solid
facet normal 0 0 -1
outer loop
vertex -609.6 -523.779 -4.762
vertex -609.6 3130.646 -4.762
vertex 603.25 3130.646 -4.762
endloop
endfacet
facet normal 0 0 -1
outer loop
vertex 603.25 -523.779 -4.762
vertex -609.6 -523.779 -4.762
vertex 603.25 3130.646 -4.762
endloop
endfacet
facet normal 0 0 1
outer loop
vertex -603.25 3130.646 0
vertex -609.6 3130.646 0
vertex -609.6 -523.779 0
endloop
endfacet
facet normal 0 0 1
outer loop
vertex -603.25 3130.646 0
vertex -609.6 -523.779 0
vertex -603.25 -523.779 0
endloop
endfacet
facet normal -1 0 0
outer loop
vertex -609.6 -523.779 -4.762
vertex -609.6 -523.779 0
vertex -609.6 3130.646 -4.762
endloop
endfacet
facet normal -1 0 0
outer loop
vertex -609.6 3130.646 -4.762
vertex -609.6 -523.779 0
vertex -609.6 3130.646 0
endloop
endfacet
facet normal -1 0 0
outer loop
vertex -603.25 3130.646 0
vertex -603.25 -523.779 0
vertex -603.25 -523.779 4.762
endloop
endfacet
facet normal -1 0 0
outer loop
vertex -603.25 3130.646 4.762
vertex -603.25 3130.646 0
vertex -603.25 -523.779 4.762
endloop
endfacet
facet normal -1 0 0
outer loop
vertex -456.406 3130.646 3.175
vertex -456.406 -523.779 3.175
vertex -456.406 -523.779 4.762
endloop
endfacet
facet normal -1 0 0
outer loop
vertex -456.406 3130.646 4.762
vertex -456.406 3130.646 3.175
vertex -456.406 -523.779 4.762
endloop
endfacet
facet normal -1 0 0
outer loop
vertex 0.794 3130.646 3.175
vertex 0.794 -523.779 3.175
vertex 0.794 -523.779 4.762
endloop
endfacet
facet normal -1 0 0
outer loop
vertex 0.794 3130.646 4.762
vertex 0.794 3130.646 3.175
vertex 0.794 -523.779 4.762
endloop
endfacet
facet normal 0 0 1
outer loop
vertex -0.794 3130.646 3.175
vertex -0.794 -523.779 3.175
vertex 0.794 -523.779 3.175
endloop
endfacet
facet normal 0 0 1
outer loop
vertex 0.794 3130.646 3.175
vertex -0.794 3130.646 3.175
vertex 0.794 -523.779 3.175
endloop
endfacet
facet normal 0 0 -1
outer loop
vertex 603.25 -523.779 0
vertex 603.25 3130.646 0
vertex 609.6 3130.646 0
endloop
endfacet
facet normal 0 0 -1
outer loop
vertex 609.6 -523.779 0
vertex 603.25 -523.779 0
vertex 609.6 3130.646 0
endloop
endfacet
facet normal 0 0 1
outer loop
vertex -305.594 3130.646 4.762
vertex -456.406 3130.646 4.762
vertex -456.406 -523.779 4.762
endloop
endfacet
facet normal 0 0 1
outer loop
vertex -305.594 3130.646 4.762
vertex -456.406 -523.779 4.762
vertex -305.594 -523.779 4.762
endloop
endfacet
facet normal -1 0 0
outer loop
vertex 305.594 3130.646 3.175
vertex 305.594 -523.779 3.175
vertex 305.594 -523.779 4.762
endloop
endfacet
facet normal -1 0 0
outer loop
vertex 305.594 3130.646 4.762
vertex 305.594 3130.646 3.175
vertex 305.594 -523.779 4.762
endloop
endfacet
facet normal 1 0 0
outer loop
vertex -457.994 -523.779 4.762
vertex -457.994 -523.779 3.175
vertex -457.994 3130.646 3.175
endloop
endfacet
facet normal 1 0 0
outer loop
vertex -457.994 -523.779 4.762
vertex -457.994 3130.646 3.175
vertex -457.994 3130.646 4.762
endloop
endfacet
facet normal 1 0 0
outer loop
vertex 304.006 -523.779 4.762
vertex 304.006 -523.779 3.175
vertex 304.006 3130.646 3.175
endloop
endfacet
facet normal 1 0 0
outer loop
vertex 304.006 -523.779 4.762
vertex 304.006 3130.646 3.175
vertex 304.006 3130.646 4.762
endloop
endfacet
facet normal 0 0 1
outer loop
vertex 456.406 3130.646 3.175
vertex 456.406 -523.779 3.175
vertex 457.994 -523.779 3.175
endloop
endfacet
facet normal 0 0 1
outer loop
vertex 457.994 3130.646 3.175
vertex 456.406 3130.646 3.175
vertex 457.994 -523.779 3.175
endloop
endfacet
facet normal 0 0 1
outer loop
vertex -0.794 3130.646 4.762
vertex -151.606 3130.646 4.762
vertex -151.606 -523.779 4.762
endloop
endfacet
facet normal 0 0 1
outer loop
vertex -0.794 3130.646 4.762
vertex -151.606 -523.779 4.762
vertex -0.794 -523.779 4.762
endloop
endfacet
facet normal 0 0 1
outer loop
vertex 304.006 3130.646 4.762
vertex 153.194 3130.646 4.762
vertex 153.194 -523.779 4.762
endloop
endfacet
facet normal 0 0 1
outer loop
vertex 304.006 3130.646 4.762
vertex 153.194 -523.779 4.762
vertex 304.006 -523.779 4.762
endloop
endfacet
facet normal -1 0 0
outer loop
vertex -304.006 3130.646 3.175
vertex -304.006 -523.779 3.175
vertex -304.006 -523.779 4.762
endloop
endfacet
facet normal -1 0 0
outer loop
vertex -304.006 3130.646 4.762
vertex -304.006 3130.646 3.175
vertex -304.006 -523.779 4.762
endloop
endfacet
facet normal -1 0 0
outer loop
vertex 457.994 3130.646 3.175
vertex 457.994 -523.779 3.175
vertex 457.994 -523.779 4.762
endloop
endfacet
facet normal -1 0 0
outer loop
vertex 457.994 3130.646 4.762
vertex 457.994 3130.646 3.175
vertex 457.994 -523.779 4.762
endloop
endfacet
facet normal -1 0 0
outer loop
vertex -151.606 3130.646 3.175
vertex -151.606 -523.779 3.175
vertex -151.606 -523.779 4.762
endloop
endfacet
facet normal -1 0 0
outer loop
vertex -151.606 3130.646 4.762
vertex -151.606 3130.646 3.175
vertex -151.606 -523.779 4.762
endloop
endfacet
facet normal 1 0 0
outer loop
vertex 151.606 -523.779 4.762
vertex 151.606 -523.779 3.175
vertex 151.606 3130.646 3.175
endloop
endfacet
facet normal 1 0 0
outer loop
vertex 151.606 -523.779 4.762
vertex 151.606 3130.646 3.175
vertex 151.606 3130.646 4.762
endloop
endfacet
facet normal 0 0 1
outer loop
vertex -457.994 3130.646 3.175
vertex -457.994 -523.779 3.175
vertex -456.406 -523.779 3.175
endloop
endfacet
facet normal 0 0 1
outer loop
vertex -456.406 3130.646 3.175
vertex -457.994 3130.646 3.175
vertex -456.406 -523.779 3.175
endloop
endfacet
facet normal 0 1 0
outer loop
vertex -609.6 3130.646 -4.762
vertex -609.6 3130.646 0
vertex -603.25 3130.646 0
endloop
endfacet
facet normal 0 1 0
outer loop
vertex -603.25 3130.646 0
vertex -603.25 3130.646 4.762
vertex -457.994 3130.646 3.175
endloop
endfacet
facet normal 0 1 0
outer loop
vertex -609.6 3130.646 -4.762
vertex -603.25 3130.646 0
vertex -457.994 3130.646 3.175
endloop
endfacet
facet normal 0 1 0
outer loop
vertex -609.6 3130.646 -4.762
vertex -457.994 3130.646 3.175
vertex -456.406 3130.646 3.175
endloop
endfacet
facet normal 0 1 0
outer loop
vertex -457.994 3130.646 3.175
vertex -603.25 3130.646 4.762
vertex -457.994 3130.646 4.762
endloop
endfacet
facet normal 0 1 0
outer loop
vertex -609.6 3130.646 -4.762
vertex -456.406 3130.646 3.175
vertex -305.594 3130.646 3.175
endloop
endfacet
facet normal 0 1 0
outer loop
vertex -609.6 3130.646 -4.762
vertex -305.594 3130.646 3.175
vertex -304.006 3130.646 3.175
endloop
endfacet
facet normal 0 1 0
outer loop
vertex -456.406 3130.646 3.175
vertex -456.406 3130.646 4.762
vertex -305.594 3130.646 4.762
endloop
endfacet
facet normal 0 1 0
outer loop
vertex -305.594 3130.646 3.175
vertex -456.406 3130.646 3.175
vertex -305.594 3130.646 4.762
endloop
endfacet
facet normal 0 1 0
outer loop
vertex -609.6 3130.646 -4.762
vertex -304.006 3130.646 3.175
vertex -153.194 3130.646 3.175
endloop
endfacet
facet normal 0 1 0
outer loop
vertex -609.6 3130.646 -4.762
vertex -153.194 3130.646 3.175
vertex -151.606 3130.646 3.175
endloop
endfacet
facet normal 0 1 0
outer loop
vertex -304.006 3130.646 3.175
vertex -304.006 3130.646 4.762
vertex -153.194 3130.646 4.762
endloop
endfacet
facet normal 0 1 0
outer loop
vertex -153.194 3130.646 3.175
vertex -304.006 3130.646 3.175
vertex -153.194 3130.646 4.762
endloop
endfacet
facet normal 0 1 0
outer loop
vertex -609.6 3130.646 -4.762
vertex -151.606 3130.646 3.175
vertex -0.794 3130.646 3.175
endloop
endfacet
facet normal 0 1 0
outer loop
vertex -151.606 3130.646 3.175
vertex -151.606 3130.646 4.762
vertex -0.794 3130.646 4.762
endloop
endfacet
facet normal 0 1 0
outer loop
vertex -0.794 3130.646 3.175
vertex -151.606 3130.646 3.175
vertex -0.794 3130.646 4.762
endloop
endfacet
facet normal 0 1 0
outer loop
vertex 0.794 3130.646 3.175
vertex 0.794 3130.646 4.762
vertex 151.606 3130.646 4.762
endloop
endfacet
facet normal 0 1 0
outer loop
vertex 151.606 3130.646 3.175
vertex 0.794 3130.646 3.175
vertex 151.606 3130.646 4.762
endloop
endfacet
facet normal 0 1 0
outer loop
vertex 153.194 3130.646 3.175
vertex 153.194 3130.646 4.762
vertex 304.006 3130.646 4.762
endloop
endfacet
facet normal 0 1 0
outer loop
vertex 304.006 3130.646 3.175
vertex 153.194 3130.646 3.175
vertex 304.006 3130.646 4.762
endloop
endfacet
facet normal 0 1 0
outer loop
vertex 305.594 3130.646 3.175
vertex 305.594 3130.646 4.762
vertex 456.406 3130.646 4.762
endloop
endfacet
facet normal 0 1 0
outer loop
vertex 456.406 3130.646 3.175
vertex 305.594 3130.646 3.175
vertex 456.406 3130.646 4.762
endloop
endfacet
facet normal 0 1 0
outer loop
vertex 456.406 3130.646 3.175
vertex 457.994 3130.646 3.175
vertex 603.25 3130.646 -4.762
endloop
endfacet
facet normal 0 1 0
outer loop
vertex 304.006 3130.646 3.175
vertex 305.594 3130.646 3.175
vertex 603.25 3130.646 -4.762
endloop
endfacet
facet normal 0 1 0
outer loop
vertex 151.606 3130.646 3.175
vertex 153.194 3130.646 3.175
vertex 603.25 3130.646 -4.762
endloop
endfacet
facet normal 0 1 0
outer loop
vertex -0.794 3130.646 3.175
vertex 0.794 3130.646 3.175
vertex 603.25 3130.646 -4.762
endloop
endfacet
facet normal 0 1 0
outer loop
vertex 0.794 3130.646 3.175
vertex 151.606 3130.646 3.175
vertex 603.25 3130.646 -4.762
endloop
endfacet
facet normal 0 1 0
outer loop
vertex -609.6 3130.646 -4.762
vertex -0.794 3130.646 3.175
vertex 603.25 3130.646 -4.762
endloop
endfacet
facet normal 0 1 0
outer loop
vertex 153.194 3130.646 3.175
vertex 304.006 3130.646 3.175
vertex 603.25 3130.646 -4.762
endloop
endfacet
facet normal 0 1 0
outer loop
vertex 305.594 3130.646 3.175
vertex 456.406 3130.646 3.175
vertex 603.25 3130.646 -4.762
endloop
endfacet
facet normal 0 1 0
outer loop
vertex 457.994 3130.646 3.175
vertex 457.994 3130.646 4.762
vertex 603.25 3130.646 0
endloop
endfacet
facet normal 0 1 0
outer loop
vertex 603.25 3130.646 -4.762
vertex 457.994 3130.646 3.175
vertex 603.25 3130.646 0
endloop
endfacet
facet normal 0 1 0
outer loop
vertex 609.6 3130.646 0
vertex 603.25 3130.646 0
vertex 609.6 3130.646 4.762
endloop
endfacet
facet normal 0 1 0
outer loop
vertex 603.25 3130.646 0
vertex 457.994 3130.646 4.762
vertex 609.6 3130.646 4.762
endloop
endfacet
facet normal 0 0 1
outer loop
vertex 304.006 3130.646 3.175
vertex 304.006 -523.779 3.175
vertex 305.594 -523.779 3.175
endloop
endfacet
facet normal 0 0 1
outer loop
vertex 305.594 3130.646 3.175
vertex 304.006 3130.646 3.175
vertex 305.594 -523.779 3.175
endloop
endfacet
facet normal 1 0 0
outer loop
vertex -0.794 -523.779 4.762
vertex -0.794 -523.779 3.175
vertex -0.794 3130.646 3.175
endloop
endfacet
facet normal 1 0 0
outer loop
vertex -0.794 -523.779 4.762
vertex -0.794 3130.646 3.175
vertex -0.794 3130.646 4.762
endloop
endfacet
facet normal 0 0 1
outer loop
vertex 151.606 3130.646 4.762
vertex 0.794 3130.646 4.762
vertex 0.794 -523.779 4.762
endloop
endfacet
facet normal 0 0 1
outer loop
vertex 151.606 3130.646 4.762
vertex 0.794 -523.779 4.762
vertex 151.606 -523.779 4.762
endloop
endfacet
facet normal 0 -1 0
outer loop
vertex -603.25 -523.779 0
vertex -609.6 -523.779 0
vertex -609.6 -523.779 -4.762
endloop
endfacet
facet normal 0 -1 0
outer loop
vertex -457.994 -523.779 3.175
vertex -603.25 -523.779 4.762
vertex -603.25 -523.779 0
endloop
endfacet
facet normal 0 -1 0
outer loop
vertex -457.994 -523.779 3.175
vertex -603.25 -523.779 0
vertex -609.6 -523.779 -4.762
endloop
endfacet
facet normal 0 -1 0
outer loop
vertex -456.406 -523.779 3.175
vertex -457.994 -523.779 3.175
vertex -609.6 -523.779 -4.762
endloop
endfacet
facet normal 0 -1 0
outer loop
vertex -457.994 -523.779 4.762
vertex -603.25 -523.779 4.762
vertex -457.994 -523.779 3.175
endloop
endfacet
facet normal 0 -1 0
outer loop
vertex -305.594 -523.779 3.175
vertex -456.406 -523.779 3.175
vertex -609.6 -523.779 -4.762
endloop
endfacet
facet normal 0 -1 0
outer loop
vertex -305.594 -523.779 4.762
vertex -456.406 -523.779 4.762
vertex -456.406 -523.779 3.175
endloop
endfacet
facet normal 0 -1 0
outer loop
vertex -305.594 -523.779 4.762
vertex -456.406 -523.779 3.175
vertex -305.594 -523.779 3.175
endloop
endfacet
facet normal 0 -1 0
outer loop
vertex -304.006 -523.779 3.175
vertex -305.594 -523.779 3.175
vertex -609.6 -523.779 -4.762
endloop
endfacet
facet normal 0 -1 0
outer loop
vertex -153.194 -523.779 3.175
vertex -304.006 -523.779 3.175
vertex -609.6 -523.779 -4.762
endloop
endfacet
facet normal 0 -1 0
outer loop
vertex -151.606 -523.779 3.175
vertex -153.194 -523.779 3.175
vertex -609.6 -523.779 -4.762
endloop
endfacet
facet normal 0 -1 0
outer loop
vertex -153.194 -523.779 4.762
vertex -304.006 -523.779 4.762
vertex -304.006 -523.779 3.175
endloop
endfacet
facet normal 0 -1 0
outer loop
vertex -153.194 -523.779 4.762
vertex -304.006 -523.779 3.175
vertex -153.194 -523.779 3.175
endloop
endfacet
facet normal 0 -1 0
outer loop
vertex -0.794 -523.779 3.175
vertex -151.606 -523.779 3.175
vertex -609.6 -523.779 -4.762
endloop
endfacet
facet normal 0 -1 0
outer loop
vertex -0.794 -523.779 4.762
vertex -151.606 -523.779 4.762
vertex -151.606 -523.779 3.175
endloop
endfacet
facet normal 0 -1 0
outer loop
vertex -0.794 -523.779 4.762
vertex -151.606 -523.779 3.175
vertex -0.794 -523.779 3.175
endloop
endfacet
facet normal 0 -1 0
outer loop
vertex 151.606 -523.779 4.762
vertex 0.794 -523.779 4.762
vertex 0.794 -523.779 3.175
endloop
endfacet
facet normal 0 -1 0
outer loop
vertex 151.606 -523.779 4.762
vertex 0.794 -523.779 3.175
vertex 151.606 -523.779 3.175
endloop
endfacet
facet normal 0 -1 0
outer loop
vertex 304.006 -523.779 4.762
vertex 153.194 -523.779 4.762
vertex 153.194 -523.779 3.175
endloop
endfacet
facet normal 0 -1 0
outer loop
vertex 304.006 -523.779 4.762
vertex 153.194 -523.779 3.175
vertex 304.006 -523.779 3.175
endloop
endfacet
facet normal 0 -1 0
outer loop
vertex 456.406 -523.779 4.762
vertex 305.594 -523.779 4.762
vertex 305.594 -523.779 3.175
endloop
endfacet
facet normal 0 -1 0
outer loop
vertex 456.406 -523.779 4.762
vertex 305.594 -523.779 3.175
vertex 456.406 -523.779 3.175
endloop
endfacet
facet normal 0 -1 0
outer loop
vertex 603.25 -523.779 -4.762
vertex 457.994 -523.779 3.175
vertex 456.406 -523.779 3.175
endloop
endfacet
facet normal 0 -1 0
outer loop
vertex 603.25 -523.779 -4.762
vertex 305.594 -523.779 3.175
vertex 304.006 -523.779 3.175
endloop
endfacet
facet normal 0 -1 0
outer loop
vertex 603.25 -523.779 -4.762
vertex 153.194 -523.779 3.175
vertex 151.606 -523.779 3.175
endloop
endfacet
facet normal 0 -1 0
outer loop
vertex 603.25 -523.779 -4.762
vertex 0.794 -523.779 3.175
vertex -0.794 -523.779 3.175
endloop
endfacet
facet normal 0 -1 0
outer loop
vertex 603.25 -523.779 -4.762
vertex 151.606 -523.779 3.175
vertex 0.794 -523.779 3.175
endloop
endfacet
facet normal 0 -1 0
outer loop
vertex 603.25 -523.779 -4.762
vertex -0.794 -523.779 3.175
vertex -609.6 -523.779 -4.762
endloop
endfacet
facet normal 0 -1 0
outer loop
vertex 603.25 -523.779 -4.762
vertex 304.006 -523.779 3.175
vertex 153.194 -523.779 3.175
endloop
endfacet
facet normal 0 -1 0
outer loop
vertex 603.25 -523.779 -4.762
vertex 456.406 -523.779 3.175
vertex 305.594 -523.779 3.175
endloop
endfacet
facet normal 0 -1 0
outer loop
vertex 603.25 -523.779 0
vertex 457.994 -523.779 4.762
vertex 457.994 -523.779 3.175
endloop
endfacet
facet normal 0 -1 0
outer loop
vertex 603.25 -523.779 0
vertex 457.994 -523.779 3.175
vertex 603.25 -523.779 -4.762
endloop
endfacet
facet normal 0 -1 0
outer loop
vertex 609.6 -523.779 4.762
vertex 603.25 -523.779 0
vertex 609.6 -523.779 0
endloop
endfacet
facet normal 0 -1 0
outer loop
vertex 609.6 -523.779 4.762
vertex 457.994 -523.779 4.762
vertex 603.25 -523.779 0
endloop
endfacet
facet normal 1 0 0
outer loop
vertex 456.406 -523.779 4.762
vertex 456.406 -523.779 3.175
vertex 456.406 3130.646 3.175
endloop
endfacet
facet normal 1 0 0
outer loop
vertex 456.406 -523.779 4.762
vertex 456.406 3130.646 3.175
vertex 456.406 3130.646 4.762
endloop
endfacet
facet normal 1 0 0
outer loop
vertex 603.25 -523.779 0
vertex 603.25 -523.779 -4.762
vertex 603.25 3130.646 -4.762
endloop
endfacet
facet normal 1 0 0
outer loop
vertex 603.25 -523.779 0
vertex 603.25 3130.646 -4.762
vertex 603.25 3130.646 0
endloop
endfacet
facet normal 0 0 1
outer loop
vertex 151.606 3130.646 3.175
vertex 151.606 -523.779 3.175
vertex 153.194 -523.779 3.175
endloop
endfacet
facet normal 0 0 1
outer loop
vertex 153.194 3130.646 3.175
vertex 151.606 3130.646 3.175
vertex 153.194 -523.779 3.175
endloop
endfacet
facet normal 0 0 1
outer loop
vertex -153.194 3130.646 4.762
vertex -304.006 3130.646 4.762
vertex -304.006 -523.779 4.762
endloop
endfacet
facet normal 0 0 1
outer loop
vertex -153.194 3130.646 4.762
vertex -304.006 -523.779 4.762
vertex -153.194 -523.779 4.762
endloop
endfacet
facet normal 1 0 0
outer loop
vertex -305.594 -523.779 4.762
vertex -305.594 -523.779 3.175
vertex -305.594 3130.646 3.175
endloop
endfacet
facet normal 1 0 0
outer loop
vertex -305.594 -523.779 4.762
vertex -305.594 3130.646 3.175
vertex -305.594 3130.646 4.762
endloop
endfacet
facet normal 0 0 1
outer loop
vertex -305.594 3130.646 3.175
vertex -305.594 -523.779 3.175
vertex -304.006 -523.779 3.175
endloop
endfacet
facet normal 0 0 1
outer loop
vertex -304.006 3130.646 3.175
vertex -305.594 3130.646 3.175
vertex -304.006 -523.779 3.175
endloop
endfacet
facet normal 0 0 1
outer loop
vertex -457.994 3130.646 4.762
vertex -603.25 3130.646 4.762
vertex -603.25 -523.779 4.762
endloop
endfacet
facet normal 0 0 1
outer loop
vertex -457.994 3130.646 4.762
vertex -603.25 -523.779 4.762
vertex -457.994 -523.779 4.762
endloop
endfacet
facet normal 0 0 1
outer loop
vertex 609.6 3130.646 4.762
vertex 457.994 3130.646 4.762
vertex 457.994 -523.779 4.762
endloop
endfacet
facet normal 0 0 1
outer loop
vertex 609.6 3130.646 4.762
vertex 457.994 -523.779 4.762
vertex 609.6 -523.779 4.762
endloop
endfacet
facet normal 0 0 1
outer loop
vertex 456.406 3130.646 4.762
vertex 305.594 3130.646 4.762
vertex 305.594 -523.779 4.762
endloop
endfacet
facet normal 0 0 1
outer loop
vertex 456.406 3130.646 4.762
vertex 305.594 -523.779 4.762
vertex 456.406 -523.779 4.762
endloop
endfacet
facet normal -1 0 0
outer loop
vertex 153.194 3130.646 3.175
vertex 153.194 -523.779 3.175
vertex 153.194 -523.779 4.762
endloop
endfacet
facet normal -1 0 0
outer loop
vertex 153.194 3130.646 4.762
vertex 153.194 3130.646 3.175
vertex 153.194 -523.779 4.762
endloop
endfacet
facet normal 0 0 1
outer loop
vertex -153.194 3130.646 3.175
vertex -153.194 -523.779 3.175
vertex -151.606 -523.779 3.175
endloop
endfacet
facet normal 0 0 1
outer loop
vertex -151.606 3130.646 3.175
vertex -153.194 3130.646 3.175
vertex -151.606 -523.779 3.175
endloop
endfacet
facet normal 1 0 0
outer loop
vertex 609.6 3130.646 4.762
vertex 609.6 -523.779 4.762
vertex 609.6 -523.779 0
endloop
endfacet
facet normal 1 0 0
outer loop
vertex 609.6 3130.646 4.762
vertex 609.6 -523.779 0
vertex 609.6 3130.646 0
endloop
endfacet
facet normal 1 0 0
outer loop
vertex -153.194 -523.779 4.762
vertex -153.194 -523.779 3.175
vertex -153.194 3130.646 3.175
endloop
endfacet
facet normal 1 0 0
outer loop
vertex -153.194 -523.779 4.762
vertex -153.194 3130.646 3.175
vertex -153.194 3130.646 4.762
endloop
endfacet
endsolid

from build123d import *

# Parameters (mm, degrees)
F0_W     = 1219.2
F0_H     = 3654.425
F1_DEPTH = 4.7625
F2_W     = 6.35
F2_H     = 4.7625
F3_DEPTH = 3654.426
F4_W     = 1.5875
F4_H     = 1.5875
F5_DEPTH = 3654.426


with BuildPart() as f1:
    # F0 (on Top) → F1 (new body, symmetric)
    with BuildSketch(Plane.XY):
        with Locations((0, 1303.43302)):
            Rectangle(F0_W, F0_H)
    extrude(amount=F1_DEPTH, both=True)

    # F2 (on face) → F3 (cut, through all)
    with BuildSketch(Plane.XZ.offset(523.77948)):
        with Locations((606.425, -2.38125)):
            Rectangle(F2_W, F2_H)
        with Locations((-606.425, 2.38125)):
            Rectangle(F2_W, F2_H)
    extrude(amount=-F3_DEPTH, mode=Mode.SUBTRACT)

    # F4 (on face) → F5 (cut, through all)
    with BuildSketch(Plane.XZ.offset(523.77948)):
        with Locations((-457.2, 3.96875)):
            Rectangle(F4_W, F4_H)
        with Locations((-304.8, 3.96875)):
            Rectangle(F4_W, F4_H)
        with Locations((-152.4, 3.96875)):
            Rectangle(F4_W, F4_H)
        with Locations((0, 3.96875)):
            Rectangle(F4_W, F4_H)
        with Locations((152.4, 3.96875)):
            Rectangle(F4_W, F4_H)
        with Locations((304.8, 3.96875)):
            Rectangle(F4_W, F4_H)
        with Locations((457.2, 3.96875)):
            Rectangle(F4_W, F4_H)
    extrude(amount=-F5_DEPTH, mode=Mode.SUBTRACT)


solid = f1.part
